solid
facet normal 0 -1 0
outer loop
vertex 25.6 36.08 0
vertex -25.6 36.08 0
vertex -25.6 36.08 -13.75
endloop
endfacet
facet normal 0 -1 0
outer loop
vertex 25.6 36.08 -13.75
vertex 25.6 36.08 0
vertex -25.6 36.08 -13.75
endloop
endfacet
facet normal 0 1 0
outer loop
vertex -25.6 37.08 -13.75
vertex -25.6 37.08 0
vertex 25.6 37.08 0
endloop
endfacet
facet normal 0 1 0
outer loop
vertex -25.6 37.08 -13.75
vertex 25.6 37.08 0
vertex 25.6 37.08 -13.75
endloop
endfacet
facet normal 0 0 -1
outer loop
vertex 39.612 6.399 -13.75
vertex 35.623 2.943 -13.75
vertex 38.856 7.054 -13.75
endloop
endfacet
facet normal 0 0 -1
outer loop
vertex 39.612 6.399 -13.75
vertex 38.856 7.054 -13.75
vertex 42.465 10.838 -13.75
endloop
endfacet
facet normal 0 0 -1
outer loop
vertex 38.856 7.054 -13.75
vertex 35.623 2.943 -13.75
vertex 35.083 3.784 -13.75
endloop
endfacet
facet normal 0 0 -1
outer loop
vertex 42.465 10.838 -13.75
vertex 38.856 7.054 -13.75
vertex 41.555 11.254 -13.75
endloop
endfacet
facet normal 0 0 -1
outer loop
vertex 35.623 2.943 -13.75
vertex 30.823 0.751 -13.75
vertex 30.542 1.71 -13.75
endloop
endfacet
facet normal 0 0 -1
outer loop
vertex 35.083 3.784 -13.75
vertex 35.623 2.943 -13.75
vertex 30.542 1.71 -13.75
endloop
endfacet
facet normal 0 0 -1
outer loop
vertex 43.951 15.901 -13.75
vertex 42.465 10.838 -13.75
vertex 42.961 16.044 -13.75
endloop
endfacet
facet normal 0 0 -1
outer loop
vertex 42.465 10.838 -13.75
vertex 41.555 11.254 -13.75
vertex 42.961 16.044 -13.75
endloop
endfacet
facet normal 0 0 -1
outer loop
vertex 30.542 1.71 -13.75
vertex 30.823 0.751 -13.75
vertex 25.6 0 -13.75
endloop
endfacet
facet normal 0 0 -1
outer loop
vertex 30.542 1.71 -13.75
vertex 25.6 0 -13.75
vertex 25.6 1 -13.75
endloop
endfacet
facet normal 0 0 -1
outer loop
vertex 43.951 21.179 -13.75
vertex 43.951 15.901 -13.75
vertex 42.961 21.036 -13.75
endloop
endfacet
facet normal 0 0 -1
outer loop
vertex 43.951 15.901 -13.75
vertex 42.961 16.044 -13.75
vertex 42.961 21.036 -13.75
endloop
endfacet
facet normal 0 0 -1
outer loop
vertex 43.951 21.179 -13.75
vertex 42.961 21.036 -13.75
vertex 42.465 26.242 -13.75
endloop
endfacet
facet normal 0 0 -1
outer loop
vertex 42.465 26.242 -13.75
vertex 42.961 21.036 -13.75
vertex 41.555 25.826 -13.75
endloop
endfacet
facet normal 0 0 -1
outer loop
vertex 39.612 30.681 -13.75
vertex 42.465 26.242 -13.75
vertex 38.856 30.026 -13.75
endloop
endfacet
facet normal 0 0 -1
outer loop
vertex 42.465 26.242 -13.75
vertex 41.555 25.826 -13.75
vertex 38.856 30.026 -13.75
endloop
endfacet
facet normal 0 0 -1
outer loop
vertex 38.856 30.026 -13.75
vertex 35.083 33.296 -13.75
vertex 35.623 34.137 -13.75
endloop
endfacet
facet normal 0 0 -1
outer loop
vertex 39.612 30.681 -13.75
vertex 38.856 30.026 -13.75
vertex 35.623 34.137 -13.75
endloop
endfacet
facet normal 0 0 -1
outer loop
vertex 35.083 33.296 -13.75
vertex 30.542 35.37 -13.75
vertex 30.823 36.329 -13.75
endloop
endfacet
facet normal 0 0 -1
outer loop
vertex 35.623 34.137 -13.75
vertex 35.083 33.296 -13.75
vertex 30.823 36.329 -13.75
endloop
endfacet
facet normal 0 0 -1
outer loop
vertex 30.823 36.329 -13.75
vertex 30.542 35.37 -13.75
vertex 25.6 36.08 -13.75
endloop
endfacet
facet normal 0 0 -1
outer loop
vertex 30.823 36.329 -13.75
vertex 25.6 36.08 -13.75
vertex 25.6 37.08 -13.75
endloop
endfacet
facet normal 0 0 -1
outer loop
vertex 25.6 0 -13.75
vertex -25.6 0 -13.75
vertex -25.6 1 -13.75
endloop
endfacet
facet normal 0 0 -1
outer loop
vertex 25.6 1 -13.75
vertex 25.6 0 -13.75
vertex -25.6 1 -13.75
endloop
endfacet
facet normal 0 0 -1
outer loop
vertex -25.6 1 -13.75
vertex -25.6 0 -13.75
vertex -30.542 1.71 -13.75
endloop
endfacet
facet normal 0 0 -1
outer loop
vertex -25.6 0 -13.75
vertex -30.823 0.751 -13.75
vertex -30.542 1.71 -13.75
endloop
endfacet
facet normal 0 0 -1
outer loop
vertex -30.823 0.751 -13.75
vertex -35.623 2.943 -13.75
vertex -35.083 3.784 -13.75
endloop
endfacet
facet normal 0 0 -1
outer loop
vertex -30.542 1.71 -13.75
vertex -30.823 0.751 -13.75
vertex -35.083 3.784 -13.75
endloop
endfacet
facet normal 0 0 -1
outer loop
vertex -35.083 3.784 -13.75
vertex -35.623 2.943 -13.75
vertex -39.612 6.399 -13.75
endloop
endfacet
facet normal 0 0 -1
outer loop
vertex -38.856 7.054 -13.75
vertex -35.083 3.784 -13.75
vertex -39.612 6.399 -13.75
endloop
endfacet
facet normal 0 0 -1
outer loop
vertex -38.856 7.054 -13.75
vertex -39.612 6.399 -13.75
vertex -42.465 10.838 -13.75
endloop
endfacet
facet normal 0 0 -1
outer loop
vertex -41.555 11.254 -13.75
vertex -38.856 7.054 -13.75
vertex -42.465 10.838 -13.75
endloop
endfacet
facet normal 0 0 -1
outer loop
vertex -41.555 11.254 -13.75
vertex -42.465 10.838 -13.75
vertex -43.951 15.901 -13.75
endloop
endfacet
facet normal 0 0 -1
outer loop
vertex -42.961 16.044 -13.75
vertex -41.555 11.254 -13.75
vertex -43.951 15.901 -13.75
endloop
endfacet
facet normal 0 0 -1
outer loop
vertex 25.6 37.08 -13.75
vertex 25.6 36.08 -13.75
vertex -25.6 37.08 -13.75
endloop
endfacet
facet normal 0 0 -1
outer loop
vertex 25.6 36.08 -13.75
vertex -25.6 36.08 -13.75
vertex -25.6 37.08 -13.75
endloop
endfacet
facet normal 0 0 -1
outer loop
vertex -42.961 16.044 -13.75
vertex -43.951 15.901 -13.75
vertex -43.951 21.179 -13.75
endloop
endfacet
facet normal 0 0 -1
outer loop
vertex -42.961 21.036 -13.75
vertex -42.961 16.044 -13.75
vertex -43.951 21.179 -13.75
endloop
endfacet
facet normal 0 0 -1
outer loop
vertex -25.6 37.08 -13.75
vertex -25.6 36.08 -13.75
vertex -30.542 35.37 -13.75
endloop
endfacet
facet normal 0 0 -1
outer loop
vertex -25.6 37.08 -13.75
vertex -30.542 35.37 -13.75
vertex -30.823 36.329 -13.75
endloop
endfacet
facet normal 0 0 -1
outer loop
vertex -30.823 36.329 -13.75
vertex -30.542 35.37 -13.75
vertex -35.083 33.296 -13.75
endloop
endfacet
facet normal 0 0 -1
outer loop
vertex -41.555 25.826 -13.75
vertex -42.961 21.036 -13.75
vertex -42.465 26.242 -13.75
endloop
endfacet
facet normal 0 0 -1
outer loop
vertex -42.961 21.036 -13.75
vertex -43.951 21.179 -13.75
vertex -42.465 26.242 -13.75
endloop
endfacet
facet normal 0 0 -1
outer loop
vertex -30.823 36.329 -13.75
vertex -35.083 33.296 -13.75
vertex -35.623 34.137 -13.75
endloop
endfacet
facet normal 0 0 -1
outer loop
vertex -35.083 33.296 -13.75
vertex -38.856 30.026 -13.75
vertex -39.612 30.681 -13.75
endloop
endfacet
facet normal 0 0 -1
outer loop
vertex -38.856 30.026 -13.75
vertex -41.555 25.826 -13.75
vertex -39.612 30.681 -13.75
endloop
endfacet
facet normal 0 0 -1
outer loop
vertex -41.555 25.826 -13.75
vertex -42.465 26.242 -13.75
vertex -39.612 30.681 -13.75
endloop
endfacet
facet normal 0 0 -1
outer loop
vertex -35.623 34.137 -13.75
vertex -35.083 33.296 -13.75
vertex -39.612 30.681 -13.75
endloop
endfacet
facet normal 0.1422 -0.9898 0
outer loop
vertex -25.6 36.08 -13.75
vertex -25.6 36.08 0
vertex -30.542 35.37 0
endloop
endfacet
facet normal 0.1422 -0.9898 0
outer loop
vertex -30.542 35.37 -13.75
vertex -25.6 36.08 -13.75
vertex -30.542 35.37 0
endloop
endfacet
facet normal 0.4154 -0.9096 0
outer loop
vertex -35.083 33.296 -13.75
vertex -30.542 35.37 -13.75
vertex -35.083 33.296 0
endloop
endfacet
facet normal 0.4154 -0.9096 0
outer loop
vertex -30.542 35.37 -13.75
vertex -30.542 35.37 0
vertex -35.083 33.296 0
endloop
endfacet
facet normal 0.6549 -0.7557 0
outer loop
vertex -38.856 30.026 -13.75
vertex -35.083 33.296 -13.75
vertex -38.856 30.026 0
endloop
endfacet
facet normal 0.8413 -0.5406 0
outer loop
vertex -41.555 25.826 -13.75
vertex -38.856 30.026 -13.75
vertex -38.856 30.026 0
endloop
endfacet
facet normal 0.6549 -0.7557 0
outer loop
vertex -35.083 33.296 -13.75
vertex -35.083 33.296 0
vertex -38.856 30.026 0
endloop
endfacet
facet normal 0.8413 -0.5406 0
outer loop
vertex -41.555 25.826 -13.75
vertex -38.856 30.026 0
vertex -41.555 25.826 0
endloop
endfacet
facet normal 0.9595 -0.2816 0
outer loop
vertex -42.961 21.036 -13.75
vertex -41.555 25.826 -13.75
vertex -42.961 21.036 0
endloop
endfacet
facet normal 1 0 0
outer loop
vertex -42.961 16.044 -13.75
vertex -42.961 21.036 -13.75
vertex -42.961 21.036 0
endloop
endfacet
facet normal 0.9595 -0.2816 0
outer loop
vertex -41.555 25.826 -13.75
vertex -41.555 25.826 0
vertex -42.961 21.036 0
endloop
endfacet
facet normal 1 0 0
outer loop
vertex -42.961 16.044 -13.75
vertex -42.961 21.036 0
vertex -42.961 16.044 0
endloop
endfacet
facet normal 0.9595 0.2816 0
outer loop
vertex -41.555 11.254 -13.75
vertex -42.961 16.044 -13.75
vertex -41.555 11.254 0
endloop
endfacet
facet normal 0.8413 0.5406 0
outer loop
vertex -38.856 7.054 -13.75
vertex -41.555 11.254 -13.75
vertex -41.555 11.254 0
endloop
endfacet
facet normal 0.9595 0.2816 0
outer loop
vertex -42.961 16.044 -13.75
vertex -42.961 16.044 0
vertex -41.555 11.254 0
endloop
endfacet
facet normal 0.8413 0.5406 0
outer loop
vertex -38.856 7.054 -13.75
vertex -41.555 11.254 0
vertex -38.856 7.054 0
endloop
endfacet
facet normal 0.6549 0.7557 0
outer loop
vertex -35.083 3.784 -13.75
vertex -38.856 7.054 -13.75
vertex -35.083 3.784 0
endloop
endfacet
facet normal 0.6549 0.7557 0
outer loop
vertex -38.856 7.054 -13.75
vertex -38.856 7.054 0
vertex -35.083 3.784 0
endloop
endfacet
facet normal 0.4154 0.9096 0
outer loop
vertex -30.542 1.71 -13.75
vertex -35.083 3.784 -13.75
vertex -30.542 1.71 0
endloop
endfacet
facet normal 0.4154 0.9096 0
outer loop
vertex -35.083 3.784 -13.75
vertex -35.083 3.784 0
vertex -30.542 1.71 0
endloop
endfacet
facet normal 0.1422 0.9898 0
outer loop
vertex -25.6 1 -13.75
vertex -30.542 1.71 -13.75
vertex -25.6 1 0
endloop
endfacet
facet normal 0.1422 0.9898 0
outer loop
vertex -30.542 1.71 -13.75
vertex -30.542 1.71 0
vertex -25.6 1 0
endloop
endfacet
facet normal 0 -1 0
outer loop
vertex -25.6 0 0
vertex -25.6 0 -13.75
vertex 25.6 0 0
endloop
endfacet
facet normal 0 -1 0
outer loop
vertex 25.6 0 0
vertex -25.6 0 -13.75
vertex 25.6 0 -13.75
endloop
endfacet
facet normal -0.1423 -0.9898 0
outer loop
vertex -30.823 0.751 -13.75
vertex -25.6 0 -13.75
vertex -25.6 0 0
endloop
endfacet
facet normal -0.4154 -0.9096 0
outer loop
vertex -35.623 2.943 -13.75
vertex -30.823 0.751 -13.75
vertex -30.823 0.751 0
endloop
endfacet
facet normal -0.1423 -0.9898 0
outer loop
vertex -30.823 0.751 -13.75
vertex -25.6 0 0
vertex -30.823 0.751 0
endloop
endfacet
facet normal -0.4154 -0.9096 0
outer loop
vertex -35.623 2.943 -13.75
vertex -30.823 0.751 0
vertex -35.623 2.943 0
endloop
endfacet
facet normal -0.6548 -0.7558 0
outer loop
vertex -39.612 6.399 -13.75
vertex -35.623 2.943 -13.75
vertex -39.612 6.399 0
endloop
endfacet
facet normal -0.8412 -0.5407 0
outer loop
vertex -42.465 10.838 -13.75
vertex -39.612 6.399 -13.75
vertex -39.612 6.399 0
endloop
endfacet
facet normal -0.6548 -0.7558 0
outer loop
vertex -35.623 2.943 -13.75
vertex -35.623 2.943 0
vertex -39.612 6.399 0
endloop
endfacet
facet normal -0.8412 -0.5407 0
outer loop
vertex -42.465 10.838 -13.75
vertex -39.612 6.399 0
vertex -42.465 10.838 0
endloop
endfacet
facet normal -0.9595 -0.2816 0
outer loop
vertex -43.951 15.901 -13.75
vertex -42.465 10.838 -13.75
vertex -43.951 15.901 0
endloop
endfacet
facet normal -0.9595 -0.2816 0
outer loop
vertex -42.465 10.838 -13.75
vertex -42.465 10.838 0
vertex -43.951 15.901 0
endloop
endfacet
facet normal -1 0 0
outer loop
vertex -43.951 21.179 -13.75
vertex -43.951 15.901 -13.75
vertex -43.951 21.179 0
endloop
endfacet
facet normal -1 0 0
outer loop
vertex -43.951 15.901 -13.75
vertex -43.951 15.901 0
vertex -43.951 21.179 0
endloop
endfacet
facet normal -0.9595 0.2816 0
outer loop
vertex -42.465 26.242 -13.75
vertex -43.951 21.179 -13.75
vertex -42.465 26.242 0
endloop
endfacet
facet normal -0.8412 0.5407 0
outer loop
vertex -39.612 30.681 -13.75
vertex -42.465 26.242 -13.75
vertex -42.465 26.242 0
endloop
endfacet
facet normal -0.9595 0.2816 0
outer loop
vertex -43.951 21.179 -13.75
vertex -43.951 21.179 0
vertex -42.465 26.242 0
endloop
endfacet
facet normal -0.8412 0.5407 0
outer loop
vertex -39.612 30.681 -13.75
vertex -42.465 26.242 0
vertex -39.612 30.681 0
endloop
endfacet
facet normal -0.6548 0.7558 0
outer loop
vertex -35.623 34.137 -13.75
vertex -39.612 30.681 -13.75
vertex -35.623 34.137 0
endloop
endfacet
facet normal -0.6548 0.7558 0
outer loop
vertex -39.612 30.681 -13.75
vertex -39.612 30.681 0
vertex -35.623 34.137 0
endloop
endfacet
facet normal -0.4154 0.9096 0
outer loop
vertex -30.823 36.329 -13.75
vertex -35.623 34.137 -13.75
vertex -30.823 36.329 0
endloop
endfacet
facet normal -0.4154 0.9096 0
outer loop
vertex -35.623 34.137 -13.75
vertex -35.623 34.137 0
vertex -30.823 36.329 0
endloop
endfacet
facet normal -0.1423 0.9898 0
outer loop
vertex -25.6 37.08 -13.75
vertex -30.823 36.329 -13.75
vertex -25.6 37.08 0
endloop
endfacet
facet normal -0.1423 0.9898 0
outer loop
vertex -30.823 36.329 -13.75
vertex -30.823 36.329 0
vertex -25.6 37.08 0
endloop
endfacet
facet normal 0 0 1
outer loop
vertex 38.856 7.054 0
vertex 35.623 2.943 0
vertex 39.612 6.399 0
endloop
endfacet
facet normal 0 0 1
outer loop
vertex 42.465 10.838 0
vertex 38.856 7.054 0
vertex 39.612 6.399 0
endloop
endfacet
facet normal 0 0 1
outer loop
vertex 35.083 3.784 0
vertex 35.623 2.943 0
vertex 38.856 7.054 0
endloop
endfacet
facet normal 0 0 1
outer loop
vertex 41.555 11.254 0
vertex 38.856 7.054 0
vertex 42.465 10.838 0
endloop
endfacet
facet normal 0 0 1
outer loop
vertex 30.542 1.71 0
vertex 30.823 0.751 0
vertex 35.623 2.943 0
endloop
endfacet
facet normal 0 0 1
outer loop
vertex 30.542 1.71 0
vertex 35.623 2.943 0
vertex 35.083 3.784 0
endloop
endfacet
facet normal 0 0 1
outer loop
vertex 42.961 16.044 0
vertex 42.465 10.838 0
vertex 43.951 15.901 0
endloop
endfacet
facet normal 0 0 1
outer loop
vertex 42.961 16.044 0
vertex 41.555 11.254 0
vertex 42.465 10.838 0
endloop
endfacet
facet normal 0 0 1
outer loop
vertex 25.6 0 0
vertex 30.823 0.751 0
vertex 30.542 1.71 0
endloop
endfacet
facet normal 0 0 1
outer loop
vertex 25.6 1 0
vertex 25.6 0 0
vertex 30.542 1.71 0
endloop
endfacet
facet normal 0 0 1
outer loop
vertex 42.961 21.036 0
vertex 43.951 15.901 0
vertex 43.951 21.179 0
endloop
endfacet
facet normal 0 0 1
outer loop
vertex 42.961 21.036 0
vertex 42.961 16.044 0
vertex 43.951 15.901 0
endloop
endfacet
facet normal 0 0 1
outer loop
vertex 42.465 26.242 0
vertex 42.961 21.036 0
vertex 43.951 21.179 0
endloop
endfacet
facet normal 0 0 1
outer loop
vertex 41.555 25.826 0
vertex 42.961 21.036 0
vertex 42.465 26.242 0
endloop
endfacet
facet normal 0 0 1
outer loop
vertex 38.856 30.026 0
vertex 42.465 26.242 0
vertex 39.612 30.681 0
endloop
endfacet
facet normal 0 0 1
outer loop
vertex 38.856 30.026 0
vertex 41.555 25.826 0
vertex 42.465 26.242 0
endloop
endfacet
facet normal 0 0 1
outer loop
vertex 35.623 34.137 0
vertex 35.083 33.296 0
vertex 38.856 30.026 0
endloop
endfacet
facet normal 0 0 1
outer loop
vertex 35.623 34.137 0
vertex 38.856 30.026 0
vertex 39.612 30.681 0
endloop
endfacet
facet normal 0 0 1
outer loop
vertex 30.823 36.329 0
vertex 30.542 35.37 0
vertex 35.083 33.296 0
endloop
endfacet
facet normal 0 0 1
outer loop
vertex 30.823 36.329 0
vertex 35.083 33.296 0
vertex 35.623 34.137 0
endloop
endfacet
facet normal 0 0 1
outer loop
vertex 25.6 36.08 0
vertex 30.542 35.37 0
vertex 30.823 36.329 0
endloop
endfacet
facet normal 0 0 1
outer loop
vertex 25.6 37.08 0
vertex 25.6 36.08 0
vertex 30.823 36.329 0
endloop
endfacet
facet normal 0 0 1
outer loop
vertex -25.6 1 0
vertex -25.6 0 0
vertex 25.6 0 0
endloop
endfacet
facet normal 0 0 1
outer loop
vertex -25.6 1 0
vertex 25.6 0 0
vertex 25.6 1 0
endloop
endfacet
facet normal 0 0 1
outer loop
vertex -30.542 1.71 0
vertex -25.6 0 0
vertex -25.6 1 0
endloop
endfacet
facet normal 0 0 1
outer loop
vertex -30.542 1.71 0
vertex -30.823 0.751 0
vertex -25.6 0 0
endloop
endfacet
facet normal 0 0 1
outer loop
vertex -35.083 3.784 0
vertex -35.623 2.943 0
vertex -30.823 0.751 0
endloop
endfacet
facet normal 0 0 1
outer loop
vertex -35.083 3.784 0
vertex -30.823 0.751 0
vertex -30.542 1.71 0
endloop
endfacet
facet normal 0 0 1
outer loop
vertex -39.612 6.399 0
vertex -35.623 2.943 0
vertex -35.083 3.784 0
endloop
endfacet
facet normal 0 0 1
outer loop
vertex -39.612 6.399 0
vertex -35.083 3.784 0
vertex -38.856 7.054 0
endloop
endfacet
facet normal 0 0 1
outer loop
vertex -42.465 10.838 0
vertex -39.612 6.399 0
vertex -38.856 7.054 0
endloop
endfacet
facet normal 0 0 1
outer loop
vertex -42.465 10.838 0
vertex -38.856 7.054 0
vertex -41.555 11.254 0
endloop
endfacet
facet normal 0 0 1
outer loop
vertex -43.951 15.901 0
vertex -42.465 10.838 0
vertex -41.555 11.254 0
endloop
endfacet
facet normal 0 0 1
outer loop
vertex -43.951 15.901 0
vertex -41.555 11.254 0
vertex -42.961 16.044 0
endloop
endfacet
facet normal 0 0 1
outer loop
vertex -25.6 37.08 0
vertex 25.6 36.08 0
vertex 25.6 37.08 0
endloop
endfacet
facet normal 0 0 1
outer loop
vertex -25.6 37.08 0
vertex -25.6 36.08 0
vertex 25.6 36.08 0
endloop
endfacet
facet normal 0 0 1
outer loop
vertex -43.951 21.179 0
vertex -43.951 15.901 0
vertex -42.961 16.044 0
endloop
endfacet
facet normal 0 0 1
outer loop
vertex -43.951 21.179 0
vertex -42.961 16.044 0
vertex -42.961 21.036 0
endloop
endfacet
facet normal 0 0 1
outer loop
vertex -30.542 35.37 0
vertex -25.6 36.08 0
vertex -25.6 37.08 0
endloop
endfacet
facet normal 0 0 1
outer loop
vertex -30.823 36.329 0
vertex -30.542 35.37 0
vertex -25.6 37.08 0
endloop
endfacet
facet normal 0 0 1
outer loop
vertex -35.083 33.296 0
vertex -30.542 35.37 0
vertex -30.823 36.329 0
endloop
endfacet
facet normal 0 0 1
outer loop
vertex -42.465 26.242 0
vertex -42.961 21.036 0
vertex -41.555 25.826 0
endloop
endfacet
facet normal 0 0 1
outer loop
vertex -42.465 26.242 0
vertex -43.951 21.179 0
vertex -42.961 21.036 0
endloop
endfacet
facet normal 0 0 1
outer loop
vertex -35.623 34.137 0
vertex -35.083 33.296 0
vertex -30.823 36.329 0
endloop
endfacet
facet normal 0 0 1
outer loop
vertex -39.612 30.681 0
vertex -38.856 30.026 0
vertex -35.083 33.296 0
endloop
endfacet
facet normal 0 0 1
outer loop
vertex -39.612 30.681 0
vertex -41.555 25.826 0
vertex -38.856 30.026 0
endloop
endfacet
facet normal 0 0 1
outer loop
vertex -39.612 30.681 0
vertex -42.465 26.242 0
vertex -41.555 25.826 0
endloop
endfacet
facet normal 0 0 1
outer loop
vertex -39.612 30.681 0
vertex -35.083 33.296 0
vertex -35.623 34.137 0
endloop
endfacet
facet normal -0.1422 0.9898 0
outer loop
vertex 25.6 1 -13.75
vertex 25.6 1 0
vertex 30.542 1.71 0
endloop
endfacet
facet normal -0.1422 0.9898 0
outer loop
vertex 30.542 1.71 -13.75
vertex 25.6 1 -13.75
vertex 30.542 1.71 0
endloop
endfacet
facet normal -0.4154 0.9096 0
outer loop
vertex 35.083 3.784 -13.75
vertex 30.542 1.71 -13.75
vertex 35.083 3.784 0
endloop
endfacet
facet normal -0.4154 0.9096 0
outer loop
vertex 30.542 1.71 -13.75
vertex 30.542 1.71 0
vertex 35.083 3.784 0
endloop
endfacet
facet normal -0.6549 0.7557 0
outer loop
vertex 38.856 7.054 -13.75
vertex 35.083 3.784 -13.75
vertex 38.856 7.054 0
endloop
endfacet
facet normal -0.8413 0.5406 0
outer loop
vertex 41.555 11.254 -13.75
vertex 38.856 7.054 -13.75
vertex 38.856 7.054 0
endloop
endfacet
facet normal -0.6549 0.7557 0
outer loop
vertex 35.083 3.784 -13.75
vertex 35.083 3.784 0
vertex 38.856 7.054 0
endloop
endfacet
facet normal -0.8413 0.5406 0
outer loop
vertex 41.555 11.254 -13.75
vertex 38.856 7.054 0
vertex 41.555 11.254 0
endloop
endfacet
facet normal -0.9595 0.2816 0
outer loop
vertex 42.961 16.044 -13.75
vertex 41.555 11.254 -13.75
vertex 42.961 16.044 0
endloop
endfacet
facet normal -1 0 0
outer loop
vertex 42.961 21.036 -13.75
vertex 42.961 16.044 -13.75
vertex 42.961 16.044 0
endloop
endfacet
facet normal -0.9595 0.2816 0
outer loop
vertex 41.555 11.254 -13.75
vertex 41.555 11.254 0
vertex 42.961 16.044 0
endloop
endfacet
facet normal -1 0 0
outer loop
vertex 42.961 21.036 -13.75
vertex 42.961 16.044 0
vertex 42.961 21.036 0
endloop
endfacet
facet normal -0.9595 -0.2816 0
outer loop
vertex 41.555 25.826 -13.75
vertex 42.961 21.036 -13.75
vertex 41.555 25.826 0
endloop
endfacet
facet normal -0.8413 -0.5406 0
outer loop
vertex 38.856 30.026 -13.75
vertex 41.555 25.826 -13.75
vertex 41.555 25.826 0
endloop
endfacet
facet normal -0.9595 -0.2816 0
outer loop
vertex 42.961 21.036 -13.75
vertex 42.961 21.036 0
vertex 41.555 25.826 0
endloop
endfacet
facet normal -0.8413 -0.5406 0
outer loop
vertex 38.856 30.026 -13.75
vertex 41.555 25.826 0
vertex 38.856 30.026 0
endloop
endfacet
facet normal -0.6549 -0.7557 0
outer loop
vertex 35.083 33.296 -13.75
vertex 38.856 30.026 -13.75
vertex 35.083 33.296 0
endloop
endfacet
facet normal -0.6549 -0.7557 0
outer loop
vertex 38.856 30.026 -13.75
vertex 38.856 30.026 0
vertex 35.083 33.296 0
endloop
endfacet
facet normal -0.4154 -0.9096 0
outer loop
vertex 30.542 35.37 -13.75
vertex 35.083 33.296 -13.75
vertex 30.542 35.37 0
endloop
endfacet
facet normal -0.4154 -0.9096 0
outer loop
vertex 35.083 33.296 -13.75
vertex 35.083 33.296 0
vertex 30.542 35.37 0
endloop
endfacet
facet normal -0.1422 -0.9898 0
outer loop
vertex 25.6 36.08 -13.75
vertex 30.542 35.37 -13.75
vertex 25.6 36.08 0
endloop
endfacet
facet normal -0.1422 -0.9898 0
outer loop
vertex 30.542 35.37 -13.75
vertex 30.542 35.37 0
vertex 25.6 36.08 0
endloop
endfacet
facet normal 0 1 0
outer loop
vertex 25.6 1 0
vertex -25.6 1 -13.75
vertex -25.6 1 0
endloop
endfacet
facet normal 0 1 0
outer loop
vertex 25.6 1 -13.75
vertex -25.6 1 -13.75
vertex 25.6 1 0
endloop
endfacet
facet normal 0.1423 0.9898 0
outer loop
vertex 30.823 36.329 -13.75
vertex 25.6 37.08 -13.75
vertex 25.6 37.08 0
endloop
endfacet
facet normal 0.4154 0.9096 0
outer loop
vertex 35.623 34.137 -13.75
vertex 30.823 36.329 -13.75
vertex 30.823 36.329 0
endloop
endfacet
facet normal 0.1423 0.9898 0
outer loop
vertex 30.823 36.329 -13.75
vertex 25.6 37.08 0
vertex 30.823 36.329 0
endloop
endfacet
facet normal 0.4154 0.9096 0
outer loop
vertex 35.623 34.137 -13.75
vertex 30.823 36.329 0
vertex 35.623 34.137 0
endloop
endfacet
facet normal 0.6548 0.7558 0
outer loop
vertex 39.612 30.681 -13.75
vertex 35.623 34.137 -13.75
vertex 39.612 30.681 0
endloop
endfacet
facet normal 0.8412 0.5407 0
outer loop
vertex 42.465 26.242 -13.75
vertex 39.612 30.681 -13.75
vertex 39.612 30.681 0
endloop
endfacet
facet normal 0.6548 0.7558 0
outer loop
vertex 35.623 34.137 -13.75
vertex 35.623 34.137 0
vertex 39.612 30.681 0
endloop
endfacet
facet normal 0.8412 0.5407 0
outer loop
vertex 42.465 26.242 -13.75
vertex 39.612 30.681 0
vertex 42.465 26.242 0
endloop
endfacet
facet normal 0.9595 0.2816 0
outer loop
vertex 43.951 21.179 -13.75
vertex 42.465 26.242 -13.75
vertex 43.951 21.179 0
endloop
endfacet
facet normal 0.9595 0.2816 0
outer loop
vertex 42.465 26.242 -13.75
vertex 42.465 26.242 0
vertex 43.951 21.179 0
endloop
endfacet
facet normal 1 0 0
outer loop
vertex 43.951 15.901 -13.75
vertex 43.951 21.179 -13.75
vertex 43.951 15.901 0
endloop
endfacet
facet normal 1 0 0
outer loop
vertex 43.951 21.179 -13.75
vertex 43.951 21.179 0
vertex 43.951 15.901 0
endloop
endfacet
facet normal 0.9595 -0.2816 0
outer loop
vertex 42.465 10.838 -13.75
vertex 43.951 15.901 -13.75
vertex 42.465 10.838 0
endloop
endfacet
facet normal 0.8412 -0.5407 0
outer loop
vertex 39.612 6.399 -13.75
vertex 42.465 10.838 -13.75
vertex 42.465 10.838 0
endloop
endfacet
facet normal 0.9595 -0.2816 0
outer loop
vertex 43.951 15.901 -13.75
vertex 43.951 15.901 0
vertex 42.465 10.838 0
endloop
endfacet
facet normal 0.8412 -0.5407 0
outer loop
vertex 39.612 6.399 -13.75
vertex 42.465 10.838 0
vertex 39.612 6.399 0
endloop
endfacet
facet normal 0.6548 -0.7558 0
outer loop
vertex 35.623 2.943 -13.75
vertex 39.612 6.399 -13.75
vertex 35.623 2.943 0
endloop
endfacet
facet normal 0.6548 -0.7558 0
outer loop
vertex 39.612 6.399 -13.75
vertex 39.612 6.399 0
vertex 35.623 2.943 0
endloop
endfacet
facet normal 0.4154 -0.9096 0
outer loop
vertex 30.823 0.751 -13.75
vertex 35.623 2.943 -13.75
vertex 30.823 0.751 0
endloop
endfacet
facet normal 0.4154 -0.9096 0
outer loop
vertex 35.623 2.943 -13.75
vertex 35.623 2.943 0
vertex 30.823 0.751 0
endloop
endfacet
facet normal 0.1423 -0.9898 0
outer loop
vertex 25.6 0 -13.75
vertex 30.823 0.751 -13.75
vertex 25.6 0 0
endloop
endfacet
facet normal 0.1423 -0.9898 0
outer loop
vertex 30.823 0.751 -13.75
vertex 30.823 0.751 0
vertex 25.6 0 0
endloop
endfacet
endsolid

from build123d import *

# Parameters (mm, degrees)
CROQUIS1_W              = 51.2
CROQUIS1_H              = 13.75
SALIENTE_EXTRUIR1_DEPTH = 1
SALIENTE_EXTRUIR2_DEPTH = 13.75
SALIENTE_EXTRUIR3_REACH = 82.173
CROQUIS4_W              = 13.75
CROQUIS4_H              = 1


with BuildPart() as part:
    # Croquis1 → Saliente-Extruir1 (new body)
    with BuildSketch(Plane(origin=(0, 0, 0), x_dir=(1, 0, 0), z_dir=(0, 1, 0))):
        with Locations((0, 6.875)):
            Rectangle(CROQUIS1_W, CROQUIS1_H)
    extrude(amount=SALIENTE_EXTRUIR1_DEPTH)

    # Croquis2 → Saliente-Extruir2 (add)
    with BuildSketch(Plane.XY):
        with BuildLine():
            Line((25.6, 36.08), (25.6, 37.08))
            ThreePointArc((25.6, 37.08), (44.14, 18.54), (25.6, 0))
            Line((25.6, 0), (25.6, 1))
            ThreePointArc((25.6, 1), (43.14, 18.54), (25.6, 36.08))
        make_face()
        with BuildLine():
            ThreePointArc((-25.6, 36.08), (-43.14, 18.54), (-25.6, 1))
            Line((-25.6, 1), (-25.6, 0))
            ThreePointArc((-25.6, 0), (-44.14, 18.54), (-25.6, 37.08))
            Line((-25.6, 37.08), (-25.6, 36.08))
        make_face()
    extrude(amount=-SALIENTE_EXTRUIR2_DEPTH)

    # Saliente-Extruir3: up to this face of the body (flat: up to its plane)
    saliente_extruir3_end = Plane(part.part.faces().sort_by_distance((25.6, 36.58, -6.875))[0])
    # Croquis4 → Saliente-Extruir3 (add, up to the picked face)
    with BuildSketch(Plane(origin=(-25.6, 0, 0), x_dir=(0, 0, -1), z_dir=(1, 0, 0)), mode=Mode.PRIVATE) as saliente_extruir3_sk1:
        with Locations((6.875, 36.58)):
            Rectangle(CROQUIS4_W, CROQUIS4_H)
    saliente_extruir3_tool1 = split(extrude(saliente_extruir3_sk1.sketch, amount=SALIENTE_EXTRUIR3_REACH, mode=Mode.PRIVATE), bisect_by=saliente_extruir3_end, keep=Keep.BOTH, mode=Mode.PRIVATE)
    add(saliente_extruir3_tool1.solids().sort_by(Axis((-25.6, 36.58, -6.875), (1, 0, 0)))[0])


solid = part.part
